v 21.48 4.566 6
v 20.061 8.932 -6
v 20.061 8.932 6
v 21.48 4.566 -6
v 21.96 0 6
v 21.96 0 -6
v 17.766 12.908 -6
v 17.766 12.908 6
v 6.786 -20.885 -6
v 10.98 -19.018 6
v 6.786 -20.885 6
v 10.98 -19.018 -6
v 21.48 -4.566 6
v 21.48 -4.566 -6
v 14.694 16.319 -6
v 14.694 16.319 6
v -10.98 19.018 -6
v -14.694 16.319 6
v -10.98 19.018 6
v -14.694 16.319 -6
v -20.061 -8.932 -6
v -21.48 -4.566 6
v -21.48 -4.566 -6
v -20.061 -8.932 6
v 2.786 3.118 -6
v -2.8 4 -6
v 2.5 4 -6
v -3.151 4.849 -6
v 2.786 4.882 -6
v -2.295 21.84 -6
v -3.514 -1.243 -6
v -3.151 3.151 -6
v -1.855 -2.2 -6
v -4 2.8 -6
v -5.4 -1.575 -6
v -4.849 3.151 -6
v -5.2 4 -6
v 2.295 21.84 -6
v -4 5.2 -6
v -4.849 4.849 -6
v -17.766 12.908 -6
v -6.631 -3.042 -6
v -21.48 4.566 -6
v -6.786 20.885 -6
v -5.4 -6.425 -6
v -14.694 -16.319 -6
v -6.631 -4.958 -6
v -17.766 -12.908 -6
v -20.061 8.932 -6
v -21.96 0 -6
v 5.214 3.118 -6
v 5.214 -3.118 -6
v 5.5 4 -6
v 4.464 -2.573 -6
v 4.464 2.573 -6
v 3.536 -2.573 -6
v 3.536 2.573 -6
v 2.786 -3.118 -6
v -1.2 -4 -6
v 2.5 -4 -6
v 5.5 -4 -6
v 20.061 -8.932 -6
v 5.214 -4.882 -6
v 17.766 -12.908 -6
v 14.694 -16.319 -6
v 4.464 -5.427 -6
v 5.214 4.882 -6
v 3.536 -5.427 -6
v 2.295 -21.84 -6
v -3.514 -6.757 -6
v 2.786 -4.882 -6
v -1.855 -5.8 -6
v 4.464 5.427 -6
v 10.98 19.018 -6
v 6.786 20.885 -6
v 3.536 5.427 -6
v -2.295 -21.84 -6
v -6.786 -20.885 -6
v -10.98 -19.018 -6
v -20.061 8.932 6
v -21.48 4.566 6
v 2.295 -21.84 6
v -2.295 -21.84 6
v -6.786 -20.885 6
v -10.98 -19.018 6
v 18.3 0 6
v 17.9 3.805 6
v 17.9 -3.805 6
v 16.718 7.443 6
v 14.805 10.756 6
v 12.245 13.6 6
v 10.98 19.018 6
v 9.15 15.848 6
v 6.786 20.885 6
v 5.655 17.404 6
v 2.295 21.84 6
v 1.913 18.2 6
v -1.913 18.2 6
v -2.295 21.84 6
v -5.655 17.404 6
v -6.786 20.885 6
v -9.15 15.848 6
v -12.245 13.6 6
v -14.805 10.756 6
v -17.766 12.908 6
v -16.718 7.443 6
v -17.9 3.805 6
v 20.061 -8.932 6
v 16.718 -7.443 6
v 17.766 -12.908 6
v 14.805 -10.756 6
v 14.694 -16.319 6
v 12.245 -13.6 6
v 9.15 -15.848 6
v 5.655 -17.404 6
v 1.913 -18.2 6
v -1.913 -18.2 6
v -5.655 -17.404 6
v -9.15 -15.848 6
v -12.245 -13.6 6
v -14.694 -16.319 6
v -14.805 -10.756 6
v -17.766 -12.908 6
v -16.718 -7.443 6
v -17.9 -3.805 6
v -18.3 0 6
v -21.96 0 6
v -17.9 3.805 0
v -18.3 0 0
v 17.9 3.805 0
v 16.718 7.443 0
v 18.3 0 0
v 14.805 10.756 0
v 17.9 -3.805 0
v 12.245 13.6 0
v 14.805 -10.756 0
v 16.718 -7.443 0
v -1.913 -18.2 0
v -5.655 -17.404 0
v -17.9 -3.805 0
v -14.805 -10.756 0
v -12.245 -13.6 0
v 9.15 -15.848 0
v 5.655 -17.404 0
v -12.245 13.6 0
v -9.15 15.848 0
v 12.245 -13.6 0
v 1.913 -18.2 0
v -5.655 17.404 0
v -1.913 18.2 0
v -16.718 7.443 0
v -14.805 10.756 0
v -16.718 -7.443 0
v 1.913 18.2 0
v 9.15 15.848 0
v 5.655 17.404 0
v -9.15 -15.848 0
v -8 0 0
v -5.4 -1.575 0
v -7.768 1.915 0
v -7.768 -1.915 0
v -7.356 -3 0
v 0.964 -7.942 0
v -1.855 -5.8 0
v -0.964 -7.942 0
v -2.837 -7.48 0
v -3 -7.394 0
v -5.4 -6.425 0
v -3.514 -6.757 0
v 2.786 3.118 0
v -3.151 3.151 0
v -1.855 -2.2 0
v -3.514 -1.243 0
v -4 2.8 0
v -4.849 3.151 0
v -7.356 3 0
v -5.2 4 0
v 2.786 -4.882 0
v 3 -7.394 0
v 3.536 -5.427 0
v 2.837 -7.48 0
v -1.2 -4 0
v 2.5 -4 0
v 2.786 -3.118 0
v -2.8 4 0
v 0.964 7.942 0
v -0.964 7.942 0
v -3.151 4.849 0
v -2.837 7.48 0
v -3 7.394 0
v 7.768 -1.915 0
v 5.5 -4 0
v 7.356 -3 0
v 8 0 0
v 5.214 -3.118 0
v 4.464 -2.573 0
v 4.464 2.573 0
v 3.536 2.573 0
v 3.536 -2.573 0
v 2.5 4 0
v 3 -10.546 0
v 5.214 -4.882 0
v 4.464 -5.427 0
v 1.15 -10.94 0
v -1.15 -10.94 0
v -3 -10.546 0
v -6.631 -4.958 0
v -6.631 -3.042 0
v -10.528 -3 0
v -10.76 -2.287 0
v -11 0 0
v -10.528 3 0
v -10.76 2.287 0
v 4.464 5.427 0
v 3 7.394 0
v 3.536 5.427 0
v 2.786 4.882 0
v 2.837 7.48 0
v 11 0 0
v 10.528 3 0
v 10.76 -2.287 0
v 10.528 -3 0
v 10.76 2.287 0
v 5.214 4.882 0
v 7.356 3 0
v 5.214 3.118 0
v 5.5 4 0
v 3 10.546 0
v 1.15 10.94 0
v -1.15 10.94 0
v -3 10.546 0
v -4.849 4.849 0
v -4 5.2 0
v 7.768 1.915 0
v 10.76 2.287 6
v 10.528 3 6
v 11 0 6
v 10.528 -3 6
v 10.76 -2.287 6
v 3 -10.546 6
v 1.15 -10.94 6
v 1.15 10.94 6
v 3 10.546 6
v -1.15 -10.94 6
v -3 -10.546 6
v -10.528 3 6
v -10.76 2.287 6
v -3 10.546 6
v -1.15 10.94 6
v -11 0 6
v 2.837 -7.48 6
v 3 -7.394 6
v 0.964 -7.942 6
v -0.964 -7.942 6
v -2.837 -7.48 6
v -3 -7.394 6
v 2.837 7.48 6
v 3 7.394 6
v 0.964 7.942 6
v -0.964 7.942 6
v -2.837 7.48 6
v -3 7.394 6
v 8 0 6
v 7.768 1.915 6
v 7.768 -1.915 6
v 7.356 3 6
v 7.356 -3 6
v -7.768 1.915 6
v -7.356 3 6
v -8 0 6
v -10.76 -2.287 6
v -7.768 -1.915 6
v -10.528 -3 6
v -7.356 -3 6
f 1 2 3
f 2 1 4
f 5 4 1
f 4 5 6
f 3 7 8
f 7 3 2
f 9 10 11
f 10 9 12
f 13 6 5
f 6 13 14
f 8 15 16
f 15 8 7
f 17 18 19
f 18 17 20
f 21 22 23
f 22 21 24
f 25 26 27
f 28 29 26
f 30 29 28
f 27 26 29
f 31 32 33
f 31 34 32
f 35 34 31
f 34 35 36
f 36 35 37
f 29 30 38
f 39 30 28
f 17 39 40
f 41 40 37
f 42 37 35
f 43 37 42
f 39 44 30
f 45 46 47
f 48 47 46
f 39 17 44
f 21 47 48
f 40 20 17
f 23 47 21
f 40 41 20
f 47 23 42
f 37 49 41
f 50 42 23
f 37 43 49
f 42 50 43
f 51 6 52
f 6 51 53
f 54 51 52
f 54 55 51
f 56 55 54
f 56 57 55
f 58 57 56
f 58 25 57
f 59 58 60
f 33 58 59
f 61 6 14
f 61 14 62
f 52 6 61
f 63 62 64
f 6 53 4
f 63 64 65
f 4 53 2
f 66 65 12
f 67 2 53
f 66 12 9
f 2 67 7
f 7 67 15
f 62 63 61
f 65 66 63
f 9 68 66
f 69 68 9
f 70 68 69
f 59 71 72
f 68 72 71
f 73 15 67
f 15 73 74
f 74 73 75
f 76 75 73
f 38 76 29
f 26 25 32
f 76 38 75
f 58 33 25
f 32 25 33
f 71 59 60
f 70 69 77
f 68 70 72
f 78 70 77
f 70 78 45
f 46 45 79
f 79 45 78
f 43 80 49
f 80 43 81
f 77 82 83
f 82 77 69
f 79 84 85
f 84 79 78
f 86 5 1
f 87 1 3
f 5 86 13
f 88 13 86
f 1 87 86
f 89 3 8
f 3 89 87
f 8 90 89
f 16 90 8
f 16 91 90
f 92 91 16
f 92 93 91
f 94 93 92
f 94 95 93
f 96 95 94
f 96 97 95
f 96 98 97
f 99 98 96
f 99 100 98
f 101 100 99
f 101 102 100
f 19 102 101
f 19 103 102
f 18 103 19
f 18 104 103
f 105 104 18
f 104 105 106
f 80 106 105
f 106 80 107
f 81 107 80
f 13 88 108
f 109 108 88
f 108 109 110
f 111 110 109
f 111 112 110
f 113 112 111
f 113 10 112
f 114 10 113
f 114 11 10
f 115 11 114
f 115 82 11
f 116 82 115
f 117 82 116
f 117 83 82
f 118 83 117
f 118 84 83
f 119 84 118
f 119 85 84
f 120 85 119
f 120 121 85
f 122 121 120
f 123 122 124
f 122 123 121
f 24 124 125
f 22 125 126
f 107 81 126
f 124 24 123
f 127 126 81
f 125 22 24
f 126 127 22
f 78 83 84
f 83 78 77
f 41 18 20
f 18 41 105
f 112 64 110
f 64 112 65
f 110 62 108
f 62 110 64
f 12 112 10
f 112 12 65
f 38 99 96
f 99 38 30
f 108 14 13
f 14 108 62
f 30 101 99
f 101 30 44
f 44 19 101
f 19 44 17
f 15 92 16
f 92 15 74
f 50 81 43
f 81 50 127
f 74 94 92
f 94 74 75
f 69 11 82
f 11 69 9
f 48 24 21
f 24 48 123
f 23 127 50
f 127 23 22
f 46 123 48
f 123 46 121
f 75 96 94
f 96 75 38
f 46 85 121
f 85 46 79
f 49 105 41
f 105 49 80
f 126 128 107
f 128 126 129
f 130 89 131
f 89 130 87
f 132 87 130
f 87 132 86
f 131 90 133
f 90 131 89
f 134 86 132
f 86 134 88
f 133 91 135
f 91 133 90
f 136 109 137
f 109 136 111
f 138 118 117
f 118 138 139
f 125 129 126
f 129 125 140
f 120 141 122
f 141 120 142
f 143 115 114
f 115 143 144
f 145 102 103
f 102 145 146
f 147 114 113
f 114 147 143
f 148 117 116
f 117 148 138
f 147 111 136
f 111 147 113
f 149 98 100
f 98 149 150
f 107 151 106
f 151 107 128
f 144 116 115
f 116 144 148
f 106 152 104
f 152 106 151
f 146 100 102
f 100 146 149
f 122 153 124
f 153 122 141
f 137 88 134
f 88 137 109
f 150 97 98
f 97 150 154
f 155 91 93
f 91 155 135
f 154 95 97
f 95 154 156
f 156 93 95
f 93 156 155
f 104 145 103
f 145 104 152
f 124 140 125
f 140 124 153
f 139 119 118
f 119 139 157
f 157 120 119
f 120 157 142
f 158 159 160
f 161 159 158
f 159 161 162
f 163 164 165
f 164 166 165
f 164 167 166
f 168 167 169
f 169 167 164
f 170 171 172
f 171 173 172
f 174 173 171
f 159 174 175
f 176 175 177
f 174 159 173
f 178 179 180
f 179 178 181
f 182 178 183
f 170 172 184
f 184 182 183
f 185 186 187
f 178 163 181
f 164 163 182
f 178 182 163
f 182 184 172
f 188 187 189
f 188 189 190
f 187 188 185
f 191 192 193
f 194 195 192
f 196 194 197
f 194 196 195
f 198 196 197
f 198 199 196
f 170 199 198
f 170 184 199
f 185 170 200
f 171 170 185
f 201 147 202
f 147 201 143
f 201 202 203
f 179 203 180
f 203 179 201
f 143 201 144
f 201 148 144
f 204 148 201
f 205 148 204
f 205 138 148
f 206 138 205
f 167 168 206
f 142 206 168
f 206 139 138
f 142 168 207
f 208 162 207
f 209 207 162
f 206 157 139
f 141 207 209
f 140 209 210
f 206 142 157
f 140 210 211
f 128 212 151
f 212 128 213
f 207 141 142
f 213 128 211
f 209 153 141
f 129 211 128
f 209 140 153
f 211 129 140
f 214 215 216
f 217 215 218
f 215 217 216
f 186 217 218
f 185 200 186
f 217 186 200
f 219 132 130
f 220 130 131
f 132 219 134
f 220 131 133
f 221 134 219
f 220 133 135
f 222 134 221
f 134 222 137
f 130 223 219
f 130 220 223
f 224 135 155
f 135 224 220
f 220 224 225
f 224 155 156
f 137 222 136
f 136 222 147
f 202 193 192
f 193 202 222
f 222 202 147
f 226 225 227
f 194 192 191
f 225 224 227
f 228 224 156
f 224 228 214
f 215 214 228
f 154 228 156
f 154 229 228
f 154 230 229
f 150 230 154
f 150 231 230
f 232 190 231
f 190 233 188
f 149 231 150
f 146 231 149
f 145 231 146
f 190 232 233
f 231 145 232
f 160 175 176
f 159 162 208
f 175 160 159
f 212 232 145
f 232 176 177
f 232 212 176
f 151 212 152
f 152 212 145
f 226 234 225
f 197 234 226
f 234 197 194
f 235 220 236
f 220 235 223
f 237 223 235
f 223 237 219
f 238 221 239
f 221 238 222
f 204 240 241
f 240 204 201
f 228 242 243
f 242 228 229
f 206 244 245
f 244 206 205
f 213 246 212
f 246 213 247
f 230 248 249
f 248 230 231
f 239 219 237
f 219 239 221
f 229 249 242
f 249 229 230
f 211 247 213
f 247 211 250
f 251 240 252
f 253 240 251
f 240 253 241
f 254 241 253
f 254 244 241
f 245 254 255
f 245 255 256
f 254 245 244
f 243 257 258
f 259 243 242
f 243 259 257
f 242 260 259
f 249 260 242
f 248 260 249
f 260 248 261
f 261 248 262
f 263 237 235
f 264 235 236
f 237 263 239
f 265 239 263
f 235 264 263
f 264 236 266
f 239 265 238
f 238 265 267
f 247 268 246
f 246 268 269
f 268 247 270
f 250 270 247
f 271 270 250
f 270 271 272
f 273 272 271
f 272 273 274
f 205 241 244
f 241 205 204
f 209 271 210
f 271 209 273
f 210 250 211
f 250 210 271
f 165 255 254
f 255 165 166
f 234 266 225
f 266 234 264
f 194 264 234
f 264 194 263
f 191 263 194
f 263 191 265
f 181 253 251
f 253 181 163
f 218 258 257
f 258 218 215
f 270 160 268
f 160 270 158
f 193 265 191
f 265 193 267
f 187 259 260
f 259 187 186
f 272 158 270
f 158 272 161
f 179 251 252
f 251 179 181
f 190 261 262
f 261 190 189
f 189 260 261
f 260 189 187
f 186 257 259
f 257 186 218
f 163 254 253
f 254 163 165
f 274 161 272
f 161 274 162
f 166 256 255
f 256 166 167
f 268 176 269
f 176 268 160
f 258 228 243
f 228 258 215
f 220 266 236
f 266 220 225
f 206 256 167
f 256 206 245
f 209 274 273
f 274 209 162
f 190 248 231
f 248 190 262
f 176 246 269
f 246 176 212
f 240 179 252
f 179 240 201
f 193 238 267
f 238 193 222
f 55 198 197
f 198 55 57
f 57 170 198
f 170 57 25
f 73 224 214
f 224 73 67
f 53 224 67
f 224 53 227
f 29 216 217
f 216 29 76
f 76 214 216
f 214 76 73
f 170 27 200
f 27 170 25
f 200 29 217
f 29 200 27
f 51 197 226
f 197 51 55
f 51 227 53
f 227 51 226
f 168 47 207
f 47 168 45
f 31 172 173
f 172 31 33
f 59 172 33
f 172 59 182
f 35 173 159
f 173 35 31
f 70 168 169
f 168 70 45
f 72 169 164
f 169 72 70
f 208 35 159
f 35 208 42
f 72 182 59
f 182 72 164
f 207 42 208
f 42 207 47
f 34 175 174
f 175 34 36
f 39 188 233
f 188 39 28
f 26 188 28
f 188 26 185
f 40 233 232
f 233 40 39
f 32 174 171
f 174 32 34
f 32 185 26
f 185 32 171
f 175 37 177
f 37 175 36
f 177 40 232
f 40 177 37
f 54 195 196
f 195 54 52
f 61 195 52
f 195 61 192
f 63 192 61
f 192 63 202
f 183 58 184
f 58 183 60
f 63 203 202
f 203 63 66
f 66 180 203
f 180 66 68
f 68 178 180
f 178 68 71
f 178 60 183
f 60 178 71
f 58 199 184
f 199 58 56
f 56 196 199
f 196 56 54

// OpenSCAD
// 250mL
insideradius = 11;
outsideradius = 18.3;

// 100mL
//insideradius = 9.3;
//outsideradius = 16.1;

// Loose fitting
//insideradius = 9;
//outsideradius = 16.5;
height = 12;
inletradius = 1.5;
filterradius= 2.8;
inducerradius = 1.2;
sampleradius = 1.5;
c0 = 14;
t0 = 10;  // tab spacing
tt = 3;   // tab thickness
i0 = 4;  //inlet spacing

module base(size) {

    difference() {
     cylinder(r=outsideradius+(outsideradius/5),
            h=size,center=true);
     translate([0,0,size/2])
        cylinder(r=outsideradius,h=size,center=true);
    } 
}
module tabs(size) {
    difference() {
     cylinder(r=insideradius,h=size,center=true);
     translate([0,0,size/2])
        cylinder(r=insideradius-tt,h=size,center=true);
     translate([t0,t0,0])
		    cube([c0,c0,height+2],center=true);
     translate([-t0,-t0,0])
		    cube([c0,c0,height+2],center=true);
     translate([-t0,t0,0])
		    cube([c0,c0,height+2],center=true);
     translate([t0,-t0,0])
		    cube([c0,c0,height+2],center=true);
    } 
}
module cap() {
	base(height);
 // rotate([0,0,45])
    tabs(height);
}
module septa() {
     difference() {
        cap();
        translate([i0,i0,0])
			      cylinder(r=inletradius,h=30,center=true,$fn=10);
        translate([-i0,-i0,0])
			      cylinder(r=filterradius,h=30,center=true);
        translate([-i0,i0,0])
			      cylinder(r=inducerradius,h=30,center=true,$fn=8);
        translate([i0,-i0,0])
			      cylinder(r=sampleradius,h=30,center=true,$fn=10);

     }
}
septa();
